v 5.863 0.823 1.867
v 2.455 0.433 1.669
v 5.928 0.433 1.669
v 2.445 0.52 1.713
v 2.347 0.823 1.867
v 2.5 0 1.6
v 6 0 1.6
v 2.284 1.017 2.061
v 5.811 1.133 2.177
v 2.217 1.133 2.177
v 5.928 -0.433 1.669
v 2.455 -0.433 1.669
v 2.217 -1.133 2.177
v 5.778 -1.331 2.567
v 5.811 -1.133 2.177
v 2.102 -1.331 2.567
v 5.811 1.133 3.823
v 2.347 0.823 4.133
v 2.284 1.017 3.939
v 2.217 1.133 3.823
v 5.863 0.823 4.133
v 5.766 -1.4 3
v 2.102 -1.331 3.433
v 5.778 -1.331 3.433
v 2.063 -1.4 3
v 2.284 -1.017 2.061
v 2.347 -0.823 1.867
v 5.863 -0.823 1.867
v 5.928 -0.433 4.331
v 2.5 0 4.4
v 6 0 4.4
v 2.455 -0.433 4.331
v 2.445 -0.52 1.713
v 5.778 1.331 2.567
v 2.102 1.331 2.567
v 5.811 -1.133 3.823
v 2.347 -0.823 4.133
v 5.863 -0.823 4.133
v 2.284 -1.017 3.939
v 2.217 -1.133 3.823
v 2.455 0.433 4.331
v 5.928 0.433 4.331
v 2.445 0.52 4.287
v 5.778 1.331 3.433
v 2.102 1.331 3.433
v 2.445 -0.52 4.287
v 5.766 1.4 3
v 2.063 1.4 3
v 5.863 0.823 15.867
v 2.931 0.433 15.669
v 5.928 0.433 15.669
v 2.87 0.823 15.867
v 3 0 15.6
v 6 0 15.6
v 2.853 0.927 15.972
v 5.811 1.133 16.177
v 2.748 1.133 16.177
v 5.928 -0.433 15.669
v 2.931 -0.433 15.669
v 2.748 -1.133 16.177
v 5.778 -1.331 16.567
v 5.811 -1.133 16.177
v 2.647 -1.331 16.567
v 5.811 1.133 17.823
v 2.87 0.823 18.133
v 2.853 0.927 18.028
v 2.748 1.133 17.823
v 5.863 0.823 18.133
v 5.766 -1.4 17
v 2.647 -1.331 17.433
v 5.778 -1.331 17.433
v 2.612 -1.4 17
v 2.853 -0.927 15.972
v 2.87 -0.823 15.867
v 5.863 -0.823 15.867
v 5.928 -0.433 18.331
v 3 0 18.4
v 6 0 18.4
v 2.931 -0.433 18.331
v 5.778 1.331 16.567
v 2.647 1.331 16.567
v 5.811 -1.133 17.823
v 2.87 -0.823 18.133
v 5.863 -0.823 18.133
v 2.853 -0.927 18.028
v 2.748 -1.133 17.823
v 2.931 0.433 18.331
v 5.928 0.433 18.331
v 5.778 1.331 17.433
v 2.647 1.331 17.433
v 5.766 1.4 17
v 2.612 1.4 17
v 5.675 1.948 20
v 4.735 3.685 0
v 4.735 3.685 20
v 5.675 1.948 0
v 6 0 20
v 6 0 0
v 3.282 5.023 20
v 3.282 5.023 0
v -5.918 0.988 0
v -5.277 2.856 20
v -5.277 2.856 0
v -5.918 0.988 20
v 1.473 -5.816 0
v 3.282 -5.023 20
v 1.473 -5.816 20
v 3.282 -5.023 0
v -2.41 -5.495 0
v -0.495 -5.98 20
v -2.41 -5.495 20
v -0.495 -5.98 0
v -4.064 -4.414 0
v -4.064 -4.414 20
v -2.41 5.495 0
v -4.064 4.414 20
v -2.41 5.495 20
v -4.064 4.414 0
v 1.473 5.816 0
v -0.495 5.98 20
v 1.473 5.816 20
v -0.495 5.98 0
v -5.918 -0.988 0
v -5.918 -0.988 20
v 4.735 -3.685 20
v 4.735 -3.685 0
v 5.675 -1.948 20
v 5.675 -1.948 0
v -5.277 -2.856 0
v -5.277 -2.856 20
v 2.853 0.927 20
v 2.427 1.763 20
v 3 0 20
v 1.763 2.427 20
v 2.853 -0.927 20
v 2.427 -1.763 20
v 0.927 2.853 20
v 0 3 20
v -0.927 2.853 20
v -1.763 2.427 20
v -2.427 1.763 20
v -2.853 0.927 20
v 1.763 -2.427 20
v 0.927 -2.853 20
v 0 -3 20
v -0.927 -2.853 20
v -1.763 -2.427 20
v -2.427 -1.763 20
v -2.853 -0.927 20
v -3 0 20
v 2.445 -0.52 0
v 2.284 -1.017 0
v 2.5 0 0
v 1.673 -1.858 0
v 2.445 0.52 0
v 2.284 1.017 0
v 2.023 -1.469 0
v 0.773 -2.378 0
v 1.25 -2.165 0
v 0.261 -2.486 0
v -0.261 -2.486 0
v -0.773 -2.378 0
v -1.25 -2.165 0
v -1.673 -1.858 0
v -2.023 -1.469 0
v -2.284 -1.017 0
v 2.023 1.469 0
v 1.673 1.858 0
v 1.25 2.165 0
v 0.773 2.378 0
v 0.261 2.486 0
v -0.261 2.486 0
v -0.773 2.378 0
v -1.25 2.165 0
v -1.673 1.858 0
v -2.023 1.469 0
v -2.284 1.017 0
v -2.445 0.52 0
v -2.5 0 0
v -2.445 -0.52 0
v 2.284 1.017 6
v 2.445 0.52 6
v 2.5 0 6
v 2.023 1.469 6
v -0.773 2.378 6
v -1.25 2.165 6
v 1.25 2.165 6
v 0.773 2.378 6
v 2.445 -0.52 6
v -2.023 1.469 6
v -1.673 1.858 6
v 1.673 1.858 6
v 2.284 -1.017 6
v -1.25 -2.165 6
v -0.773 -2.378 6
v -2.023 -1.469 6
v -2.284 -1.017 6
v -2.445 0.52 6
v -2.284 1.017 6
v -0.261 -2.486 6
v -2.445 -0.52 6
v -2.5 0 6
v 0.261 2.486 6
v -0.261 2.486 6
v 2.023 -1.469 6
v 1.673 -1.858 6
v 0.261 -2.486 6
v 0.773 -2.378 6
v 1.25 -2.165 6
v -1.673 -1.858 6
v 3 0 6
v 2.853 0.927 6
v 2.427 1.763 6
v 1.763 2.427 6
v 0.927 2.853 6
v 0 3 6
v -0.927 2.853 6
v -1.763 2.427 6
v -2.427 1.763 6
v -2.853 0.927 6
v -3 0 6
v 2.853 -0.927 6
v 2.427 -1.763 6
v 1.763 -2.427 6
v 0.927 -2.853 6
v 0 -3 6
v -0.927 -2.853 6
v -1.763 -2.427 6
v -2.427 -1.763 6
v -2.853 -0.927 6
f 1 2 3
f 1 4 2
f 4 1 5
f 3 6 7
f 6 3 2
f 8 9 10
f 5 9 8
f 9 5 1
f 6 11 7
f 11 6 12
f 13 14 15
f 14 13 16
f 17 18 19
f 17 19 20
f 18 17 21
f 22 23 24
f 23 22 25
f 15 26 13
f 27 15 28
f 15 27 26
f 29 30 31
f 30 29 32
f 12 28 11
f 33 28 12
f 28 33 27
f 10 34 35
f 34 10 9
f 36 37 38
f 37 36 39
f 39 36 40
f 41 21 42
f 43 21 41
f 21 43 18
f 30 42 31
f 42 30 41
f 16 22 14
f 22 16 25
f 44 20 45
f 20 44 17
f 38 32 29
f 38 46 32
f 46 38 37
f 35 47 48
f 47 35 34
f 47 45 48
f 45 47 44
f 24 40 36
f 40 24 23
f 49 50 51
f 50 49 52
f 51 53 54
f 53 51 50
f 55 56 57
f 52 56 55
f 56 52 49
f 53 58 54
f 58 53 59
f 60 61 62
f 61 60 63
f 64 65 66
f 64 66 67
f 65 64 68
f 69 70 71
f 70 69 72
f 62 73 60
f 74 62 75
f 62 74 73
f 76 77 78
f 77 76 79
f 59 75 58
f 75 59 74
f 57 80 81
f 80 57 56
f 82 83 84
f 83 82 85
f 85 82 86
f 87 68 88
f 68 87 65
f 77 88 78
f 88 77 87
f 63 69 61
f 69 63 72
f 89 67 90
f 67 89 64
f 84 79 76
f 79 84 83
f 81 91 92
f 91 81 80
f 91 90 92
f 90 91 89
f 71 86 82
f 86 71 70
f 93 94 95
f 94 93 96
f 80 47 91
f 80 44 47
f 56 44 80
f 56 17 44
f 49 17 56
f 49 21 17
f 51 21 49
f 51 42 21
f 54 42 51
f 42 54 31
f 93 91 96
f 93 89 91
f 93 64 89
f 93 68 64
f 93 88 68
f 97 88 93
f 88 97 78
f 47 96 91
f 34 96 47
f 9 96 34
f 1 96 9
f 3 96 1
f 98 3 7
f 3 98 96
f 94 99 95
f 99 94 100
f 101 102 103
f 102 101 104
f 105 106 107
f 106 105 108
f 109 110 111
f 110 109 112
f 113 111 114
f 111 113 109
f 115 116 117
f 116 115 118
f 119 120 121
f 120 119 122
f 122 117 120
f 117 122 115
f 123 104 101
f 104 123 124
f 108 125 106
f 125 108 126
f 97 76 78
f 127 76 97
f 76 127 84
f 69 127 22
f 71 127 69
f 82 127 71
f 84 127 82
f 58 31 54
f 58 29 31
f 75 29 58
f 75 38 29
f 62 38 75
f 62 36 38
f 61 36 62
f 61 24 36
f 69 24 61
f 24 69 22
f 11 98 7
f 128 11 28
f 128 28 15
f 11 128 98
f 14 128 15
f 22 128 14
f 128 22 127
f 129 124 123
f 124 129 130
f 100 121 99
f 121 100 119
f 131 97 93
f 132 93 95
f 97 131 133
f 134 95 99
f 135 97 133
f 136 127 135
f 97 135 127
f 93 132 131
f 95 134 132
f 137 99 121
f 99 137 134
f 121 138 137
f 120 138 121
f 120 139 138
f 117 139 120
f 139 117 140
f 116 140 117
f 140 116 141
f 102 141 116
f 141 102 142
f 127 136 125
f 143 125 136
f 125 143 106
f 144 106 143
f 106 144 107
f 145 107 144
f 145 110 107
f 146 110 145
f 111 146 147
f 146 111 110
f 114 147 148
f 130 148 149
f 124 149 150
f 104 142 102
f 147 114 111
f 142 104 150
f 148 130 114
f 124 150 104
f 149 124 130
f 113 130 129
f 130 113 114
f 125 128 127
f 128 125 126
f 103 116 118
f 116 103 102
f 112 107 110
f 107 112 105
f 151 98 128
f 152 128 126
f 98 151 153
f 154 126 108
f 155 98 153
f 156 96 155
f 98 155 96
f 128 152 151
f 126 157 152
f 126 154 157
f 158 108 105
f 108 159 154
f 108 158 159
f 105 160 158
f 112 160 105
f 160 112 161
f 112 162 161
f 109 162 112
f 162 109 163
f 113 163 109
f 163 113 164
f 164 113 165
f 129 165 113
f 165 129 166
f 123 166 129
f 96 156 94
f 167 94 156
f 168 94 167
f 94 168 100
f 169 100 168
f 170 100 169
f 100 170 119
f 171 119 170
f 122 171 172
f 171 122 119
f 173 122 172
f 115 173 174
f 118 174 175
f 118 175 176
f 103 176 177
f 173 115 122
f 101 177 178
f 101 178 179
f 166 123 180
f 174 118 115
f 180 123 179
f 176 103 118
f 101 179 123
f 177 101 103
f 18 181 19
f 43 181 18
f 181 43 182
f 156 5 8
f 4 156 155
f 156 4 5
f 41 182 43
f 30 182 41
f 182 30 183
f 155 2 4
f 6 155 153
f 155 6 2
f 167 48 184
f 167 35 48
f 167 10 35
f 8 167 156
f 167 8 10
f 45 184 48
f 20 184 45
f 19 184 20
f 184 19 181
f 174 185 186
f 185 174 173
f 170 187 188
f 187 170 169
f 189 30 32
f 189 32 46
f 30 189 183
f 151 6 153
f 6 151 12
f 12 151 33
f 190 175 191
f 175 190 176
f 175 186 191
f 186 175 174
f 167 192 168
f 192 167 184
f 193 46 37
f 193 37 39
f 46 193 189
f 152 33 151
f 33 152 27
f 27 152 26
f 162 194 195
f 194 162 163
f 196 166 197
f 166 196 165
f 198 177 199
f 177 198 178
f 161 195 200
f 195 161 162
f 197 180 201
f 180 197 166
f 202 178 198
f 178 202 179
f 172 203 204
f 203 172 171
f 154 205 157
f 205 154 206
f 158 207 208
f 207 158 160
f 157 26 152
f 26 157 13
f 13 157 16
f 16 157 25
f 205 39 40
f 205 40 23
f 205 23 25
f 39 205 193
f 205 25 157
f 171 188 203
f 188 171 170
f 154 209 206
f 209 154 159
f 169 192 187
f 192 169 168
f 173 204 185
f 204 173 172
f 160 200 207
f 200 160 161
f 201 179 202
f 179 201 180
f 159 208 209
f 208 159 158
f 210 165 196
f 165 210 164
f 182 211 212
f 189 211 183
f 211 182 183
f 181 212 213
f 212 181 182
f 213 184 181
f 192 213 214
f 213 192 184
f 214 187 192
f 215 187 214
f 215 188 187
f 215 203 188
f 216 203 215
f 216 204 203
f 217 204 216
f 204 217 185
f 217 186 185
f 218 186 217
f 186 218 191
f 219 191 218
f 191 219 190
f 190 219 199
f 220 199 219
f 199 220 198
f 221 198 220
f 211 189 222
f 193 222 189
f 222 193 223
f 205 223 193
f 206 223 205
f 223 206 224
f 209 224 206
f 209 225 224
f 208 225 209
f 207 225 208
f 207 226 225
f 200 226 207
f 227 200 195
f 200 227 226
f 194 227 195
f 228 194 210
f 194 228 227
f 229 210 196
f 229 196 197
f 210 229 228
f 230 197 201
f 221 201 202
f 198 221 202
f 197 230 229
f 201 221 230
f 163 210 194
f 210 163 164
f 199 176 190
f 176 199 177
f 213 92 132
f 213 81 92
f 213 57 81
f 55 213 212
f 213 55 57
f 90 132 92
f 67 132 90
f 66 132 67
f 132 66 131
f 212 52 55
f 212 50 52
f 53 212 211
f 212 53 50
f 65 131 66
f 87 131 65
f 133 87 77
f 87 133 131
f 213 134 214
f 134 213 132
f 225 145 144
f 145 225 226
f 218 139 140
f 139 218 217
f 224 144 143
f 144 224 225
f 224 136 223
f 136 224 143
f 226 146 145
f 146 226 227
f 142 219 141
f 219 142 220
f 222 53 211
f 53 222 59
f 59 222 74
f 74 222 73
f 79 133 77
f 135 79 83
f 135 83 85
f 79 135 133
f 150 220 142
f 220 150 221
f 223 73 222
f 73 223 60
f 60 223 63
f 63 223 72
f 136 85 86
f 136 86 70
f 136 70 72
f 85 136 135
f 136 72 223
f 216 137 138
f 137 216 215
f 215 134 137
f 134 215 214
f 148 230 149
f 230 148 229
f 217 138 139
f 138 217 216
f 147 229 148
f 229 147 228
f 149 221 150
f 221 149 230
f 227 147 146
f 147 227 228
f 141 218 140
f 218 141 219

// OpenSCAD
difference(){
    cylinder(r=6,h=20);
    cylinder(r=2.5,h=6,$fn=30);
    translate([0,0,6]){
        cylinder(r=3,h=14,$fn=20);
    }
    rotate([0,90,0]){
        translate([-3,0,0]){
            #cylinder(r=1.4,h=6,center=false,$fn=20);
        }
        translate([-17,0,0]){
            #cylinder(r=1.4,h=6,center=false,$fn=20);
        }
    }
}
